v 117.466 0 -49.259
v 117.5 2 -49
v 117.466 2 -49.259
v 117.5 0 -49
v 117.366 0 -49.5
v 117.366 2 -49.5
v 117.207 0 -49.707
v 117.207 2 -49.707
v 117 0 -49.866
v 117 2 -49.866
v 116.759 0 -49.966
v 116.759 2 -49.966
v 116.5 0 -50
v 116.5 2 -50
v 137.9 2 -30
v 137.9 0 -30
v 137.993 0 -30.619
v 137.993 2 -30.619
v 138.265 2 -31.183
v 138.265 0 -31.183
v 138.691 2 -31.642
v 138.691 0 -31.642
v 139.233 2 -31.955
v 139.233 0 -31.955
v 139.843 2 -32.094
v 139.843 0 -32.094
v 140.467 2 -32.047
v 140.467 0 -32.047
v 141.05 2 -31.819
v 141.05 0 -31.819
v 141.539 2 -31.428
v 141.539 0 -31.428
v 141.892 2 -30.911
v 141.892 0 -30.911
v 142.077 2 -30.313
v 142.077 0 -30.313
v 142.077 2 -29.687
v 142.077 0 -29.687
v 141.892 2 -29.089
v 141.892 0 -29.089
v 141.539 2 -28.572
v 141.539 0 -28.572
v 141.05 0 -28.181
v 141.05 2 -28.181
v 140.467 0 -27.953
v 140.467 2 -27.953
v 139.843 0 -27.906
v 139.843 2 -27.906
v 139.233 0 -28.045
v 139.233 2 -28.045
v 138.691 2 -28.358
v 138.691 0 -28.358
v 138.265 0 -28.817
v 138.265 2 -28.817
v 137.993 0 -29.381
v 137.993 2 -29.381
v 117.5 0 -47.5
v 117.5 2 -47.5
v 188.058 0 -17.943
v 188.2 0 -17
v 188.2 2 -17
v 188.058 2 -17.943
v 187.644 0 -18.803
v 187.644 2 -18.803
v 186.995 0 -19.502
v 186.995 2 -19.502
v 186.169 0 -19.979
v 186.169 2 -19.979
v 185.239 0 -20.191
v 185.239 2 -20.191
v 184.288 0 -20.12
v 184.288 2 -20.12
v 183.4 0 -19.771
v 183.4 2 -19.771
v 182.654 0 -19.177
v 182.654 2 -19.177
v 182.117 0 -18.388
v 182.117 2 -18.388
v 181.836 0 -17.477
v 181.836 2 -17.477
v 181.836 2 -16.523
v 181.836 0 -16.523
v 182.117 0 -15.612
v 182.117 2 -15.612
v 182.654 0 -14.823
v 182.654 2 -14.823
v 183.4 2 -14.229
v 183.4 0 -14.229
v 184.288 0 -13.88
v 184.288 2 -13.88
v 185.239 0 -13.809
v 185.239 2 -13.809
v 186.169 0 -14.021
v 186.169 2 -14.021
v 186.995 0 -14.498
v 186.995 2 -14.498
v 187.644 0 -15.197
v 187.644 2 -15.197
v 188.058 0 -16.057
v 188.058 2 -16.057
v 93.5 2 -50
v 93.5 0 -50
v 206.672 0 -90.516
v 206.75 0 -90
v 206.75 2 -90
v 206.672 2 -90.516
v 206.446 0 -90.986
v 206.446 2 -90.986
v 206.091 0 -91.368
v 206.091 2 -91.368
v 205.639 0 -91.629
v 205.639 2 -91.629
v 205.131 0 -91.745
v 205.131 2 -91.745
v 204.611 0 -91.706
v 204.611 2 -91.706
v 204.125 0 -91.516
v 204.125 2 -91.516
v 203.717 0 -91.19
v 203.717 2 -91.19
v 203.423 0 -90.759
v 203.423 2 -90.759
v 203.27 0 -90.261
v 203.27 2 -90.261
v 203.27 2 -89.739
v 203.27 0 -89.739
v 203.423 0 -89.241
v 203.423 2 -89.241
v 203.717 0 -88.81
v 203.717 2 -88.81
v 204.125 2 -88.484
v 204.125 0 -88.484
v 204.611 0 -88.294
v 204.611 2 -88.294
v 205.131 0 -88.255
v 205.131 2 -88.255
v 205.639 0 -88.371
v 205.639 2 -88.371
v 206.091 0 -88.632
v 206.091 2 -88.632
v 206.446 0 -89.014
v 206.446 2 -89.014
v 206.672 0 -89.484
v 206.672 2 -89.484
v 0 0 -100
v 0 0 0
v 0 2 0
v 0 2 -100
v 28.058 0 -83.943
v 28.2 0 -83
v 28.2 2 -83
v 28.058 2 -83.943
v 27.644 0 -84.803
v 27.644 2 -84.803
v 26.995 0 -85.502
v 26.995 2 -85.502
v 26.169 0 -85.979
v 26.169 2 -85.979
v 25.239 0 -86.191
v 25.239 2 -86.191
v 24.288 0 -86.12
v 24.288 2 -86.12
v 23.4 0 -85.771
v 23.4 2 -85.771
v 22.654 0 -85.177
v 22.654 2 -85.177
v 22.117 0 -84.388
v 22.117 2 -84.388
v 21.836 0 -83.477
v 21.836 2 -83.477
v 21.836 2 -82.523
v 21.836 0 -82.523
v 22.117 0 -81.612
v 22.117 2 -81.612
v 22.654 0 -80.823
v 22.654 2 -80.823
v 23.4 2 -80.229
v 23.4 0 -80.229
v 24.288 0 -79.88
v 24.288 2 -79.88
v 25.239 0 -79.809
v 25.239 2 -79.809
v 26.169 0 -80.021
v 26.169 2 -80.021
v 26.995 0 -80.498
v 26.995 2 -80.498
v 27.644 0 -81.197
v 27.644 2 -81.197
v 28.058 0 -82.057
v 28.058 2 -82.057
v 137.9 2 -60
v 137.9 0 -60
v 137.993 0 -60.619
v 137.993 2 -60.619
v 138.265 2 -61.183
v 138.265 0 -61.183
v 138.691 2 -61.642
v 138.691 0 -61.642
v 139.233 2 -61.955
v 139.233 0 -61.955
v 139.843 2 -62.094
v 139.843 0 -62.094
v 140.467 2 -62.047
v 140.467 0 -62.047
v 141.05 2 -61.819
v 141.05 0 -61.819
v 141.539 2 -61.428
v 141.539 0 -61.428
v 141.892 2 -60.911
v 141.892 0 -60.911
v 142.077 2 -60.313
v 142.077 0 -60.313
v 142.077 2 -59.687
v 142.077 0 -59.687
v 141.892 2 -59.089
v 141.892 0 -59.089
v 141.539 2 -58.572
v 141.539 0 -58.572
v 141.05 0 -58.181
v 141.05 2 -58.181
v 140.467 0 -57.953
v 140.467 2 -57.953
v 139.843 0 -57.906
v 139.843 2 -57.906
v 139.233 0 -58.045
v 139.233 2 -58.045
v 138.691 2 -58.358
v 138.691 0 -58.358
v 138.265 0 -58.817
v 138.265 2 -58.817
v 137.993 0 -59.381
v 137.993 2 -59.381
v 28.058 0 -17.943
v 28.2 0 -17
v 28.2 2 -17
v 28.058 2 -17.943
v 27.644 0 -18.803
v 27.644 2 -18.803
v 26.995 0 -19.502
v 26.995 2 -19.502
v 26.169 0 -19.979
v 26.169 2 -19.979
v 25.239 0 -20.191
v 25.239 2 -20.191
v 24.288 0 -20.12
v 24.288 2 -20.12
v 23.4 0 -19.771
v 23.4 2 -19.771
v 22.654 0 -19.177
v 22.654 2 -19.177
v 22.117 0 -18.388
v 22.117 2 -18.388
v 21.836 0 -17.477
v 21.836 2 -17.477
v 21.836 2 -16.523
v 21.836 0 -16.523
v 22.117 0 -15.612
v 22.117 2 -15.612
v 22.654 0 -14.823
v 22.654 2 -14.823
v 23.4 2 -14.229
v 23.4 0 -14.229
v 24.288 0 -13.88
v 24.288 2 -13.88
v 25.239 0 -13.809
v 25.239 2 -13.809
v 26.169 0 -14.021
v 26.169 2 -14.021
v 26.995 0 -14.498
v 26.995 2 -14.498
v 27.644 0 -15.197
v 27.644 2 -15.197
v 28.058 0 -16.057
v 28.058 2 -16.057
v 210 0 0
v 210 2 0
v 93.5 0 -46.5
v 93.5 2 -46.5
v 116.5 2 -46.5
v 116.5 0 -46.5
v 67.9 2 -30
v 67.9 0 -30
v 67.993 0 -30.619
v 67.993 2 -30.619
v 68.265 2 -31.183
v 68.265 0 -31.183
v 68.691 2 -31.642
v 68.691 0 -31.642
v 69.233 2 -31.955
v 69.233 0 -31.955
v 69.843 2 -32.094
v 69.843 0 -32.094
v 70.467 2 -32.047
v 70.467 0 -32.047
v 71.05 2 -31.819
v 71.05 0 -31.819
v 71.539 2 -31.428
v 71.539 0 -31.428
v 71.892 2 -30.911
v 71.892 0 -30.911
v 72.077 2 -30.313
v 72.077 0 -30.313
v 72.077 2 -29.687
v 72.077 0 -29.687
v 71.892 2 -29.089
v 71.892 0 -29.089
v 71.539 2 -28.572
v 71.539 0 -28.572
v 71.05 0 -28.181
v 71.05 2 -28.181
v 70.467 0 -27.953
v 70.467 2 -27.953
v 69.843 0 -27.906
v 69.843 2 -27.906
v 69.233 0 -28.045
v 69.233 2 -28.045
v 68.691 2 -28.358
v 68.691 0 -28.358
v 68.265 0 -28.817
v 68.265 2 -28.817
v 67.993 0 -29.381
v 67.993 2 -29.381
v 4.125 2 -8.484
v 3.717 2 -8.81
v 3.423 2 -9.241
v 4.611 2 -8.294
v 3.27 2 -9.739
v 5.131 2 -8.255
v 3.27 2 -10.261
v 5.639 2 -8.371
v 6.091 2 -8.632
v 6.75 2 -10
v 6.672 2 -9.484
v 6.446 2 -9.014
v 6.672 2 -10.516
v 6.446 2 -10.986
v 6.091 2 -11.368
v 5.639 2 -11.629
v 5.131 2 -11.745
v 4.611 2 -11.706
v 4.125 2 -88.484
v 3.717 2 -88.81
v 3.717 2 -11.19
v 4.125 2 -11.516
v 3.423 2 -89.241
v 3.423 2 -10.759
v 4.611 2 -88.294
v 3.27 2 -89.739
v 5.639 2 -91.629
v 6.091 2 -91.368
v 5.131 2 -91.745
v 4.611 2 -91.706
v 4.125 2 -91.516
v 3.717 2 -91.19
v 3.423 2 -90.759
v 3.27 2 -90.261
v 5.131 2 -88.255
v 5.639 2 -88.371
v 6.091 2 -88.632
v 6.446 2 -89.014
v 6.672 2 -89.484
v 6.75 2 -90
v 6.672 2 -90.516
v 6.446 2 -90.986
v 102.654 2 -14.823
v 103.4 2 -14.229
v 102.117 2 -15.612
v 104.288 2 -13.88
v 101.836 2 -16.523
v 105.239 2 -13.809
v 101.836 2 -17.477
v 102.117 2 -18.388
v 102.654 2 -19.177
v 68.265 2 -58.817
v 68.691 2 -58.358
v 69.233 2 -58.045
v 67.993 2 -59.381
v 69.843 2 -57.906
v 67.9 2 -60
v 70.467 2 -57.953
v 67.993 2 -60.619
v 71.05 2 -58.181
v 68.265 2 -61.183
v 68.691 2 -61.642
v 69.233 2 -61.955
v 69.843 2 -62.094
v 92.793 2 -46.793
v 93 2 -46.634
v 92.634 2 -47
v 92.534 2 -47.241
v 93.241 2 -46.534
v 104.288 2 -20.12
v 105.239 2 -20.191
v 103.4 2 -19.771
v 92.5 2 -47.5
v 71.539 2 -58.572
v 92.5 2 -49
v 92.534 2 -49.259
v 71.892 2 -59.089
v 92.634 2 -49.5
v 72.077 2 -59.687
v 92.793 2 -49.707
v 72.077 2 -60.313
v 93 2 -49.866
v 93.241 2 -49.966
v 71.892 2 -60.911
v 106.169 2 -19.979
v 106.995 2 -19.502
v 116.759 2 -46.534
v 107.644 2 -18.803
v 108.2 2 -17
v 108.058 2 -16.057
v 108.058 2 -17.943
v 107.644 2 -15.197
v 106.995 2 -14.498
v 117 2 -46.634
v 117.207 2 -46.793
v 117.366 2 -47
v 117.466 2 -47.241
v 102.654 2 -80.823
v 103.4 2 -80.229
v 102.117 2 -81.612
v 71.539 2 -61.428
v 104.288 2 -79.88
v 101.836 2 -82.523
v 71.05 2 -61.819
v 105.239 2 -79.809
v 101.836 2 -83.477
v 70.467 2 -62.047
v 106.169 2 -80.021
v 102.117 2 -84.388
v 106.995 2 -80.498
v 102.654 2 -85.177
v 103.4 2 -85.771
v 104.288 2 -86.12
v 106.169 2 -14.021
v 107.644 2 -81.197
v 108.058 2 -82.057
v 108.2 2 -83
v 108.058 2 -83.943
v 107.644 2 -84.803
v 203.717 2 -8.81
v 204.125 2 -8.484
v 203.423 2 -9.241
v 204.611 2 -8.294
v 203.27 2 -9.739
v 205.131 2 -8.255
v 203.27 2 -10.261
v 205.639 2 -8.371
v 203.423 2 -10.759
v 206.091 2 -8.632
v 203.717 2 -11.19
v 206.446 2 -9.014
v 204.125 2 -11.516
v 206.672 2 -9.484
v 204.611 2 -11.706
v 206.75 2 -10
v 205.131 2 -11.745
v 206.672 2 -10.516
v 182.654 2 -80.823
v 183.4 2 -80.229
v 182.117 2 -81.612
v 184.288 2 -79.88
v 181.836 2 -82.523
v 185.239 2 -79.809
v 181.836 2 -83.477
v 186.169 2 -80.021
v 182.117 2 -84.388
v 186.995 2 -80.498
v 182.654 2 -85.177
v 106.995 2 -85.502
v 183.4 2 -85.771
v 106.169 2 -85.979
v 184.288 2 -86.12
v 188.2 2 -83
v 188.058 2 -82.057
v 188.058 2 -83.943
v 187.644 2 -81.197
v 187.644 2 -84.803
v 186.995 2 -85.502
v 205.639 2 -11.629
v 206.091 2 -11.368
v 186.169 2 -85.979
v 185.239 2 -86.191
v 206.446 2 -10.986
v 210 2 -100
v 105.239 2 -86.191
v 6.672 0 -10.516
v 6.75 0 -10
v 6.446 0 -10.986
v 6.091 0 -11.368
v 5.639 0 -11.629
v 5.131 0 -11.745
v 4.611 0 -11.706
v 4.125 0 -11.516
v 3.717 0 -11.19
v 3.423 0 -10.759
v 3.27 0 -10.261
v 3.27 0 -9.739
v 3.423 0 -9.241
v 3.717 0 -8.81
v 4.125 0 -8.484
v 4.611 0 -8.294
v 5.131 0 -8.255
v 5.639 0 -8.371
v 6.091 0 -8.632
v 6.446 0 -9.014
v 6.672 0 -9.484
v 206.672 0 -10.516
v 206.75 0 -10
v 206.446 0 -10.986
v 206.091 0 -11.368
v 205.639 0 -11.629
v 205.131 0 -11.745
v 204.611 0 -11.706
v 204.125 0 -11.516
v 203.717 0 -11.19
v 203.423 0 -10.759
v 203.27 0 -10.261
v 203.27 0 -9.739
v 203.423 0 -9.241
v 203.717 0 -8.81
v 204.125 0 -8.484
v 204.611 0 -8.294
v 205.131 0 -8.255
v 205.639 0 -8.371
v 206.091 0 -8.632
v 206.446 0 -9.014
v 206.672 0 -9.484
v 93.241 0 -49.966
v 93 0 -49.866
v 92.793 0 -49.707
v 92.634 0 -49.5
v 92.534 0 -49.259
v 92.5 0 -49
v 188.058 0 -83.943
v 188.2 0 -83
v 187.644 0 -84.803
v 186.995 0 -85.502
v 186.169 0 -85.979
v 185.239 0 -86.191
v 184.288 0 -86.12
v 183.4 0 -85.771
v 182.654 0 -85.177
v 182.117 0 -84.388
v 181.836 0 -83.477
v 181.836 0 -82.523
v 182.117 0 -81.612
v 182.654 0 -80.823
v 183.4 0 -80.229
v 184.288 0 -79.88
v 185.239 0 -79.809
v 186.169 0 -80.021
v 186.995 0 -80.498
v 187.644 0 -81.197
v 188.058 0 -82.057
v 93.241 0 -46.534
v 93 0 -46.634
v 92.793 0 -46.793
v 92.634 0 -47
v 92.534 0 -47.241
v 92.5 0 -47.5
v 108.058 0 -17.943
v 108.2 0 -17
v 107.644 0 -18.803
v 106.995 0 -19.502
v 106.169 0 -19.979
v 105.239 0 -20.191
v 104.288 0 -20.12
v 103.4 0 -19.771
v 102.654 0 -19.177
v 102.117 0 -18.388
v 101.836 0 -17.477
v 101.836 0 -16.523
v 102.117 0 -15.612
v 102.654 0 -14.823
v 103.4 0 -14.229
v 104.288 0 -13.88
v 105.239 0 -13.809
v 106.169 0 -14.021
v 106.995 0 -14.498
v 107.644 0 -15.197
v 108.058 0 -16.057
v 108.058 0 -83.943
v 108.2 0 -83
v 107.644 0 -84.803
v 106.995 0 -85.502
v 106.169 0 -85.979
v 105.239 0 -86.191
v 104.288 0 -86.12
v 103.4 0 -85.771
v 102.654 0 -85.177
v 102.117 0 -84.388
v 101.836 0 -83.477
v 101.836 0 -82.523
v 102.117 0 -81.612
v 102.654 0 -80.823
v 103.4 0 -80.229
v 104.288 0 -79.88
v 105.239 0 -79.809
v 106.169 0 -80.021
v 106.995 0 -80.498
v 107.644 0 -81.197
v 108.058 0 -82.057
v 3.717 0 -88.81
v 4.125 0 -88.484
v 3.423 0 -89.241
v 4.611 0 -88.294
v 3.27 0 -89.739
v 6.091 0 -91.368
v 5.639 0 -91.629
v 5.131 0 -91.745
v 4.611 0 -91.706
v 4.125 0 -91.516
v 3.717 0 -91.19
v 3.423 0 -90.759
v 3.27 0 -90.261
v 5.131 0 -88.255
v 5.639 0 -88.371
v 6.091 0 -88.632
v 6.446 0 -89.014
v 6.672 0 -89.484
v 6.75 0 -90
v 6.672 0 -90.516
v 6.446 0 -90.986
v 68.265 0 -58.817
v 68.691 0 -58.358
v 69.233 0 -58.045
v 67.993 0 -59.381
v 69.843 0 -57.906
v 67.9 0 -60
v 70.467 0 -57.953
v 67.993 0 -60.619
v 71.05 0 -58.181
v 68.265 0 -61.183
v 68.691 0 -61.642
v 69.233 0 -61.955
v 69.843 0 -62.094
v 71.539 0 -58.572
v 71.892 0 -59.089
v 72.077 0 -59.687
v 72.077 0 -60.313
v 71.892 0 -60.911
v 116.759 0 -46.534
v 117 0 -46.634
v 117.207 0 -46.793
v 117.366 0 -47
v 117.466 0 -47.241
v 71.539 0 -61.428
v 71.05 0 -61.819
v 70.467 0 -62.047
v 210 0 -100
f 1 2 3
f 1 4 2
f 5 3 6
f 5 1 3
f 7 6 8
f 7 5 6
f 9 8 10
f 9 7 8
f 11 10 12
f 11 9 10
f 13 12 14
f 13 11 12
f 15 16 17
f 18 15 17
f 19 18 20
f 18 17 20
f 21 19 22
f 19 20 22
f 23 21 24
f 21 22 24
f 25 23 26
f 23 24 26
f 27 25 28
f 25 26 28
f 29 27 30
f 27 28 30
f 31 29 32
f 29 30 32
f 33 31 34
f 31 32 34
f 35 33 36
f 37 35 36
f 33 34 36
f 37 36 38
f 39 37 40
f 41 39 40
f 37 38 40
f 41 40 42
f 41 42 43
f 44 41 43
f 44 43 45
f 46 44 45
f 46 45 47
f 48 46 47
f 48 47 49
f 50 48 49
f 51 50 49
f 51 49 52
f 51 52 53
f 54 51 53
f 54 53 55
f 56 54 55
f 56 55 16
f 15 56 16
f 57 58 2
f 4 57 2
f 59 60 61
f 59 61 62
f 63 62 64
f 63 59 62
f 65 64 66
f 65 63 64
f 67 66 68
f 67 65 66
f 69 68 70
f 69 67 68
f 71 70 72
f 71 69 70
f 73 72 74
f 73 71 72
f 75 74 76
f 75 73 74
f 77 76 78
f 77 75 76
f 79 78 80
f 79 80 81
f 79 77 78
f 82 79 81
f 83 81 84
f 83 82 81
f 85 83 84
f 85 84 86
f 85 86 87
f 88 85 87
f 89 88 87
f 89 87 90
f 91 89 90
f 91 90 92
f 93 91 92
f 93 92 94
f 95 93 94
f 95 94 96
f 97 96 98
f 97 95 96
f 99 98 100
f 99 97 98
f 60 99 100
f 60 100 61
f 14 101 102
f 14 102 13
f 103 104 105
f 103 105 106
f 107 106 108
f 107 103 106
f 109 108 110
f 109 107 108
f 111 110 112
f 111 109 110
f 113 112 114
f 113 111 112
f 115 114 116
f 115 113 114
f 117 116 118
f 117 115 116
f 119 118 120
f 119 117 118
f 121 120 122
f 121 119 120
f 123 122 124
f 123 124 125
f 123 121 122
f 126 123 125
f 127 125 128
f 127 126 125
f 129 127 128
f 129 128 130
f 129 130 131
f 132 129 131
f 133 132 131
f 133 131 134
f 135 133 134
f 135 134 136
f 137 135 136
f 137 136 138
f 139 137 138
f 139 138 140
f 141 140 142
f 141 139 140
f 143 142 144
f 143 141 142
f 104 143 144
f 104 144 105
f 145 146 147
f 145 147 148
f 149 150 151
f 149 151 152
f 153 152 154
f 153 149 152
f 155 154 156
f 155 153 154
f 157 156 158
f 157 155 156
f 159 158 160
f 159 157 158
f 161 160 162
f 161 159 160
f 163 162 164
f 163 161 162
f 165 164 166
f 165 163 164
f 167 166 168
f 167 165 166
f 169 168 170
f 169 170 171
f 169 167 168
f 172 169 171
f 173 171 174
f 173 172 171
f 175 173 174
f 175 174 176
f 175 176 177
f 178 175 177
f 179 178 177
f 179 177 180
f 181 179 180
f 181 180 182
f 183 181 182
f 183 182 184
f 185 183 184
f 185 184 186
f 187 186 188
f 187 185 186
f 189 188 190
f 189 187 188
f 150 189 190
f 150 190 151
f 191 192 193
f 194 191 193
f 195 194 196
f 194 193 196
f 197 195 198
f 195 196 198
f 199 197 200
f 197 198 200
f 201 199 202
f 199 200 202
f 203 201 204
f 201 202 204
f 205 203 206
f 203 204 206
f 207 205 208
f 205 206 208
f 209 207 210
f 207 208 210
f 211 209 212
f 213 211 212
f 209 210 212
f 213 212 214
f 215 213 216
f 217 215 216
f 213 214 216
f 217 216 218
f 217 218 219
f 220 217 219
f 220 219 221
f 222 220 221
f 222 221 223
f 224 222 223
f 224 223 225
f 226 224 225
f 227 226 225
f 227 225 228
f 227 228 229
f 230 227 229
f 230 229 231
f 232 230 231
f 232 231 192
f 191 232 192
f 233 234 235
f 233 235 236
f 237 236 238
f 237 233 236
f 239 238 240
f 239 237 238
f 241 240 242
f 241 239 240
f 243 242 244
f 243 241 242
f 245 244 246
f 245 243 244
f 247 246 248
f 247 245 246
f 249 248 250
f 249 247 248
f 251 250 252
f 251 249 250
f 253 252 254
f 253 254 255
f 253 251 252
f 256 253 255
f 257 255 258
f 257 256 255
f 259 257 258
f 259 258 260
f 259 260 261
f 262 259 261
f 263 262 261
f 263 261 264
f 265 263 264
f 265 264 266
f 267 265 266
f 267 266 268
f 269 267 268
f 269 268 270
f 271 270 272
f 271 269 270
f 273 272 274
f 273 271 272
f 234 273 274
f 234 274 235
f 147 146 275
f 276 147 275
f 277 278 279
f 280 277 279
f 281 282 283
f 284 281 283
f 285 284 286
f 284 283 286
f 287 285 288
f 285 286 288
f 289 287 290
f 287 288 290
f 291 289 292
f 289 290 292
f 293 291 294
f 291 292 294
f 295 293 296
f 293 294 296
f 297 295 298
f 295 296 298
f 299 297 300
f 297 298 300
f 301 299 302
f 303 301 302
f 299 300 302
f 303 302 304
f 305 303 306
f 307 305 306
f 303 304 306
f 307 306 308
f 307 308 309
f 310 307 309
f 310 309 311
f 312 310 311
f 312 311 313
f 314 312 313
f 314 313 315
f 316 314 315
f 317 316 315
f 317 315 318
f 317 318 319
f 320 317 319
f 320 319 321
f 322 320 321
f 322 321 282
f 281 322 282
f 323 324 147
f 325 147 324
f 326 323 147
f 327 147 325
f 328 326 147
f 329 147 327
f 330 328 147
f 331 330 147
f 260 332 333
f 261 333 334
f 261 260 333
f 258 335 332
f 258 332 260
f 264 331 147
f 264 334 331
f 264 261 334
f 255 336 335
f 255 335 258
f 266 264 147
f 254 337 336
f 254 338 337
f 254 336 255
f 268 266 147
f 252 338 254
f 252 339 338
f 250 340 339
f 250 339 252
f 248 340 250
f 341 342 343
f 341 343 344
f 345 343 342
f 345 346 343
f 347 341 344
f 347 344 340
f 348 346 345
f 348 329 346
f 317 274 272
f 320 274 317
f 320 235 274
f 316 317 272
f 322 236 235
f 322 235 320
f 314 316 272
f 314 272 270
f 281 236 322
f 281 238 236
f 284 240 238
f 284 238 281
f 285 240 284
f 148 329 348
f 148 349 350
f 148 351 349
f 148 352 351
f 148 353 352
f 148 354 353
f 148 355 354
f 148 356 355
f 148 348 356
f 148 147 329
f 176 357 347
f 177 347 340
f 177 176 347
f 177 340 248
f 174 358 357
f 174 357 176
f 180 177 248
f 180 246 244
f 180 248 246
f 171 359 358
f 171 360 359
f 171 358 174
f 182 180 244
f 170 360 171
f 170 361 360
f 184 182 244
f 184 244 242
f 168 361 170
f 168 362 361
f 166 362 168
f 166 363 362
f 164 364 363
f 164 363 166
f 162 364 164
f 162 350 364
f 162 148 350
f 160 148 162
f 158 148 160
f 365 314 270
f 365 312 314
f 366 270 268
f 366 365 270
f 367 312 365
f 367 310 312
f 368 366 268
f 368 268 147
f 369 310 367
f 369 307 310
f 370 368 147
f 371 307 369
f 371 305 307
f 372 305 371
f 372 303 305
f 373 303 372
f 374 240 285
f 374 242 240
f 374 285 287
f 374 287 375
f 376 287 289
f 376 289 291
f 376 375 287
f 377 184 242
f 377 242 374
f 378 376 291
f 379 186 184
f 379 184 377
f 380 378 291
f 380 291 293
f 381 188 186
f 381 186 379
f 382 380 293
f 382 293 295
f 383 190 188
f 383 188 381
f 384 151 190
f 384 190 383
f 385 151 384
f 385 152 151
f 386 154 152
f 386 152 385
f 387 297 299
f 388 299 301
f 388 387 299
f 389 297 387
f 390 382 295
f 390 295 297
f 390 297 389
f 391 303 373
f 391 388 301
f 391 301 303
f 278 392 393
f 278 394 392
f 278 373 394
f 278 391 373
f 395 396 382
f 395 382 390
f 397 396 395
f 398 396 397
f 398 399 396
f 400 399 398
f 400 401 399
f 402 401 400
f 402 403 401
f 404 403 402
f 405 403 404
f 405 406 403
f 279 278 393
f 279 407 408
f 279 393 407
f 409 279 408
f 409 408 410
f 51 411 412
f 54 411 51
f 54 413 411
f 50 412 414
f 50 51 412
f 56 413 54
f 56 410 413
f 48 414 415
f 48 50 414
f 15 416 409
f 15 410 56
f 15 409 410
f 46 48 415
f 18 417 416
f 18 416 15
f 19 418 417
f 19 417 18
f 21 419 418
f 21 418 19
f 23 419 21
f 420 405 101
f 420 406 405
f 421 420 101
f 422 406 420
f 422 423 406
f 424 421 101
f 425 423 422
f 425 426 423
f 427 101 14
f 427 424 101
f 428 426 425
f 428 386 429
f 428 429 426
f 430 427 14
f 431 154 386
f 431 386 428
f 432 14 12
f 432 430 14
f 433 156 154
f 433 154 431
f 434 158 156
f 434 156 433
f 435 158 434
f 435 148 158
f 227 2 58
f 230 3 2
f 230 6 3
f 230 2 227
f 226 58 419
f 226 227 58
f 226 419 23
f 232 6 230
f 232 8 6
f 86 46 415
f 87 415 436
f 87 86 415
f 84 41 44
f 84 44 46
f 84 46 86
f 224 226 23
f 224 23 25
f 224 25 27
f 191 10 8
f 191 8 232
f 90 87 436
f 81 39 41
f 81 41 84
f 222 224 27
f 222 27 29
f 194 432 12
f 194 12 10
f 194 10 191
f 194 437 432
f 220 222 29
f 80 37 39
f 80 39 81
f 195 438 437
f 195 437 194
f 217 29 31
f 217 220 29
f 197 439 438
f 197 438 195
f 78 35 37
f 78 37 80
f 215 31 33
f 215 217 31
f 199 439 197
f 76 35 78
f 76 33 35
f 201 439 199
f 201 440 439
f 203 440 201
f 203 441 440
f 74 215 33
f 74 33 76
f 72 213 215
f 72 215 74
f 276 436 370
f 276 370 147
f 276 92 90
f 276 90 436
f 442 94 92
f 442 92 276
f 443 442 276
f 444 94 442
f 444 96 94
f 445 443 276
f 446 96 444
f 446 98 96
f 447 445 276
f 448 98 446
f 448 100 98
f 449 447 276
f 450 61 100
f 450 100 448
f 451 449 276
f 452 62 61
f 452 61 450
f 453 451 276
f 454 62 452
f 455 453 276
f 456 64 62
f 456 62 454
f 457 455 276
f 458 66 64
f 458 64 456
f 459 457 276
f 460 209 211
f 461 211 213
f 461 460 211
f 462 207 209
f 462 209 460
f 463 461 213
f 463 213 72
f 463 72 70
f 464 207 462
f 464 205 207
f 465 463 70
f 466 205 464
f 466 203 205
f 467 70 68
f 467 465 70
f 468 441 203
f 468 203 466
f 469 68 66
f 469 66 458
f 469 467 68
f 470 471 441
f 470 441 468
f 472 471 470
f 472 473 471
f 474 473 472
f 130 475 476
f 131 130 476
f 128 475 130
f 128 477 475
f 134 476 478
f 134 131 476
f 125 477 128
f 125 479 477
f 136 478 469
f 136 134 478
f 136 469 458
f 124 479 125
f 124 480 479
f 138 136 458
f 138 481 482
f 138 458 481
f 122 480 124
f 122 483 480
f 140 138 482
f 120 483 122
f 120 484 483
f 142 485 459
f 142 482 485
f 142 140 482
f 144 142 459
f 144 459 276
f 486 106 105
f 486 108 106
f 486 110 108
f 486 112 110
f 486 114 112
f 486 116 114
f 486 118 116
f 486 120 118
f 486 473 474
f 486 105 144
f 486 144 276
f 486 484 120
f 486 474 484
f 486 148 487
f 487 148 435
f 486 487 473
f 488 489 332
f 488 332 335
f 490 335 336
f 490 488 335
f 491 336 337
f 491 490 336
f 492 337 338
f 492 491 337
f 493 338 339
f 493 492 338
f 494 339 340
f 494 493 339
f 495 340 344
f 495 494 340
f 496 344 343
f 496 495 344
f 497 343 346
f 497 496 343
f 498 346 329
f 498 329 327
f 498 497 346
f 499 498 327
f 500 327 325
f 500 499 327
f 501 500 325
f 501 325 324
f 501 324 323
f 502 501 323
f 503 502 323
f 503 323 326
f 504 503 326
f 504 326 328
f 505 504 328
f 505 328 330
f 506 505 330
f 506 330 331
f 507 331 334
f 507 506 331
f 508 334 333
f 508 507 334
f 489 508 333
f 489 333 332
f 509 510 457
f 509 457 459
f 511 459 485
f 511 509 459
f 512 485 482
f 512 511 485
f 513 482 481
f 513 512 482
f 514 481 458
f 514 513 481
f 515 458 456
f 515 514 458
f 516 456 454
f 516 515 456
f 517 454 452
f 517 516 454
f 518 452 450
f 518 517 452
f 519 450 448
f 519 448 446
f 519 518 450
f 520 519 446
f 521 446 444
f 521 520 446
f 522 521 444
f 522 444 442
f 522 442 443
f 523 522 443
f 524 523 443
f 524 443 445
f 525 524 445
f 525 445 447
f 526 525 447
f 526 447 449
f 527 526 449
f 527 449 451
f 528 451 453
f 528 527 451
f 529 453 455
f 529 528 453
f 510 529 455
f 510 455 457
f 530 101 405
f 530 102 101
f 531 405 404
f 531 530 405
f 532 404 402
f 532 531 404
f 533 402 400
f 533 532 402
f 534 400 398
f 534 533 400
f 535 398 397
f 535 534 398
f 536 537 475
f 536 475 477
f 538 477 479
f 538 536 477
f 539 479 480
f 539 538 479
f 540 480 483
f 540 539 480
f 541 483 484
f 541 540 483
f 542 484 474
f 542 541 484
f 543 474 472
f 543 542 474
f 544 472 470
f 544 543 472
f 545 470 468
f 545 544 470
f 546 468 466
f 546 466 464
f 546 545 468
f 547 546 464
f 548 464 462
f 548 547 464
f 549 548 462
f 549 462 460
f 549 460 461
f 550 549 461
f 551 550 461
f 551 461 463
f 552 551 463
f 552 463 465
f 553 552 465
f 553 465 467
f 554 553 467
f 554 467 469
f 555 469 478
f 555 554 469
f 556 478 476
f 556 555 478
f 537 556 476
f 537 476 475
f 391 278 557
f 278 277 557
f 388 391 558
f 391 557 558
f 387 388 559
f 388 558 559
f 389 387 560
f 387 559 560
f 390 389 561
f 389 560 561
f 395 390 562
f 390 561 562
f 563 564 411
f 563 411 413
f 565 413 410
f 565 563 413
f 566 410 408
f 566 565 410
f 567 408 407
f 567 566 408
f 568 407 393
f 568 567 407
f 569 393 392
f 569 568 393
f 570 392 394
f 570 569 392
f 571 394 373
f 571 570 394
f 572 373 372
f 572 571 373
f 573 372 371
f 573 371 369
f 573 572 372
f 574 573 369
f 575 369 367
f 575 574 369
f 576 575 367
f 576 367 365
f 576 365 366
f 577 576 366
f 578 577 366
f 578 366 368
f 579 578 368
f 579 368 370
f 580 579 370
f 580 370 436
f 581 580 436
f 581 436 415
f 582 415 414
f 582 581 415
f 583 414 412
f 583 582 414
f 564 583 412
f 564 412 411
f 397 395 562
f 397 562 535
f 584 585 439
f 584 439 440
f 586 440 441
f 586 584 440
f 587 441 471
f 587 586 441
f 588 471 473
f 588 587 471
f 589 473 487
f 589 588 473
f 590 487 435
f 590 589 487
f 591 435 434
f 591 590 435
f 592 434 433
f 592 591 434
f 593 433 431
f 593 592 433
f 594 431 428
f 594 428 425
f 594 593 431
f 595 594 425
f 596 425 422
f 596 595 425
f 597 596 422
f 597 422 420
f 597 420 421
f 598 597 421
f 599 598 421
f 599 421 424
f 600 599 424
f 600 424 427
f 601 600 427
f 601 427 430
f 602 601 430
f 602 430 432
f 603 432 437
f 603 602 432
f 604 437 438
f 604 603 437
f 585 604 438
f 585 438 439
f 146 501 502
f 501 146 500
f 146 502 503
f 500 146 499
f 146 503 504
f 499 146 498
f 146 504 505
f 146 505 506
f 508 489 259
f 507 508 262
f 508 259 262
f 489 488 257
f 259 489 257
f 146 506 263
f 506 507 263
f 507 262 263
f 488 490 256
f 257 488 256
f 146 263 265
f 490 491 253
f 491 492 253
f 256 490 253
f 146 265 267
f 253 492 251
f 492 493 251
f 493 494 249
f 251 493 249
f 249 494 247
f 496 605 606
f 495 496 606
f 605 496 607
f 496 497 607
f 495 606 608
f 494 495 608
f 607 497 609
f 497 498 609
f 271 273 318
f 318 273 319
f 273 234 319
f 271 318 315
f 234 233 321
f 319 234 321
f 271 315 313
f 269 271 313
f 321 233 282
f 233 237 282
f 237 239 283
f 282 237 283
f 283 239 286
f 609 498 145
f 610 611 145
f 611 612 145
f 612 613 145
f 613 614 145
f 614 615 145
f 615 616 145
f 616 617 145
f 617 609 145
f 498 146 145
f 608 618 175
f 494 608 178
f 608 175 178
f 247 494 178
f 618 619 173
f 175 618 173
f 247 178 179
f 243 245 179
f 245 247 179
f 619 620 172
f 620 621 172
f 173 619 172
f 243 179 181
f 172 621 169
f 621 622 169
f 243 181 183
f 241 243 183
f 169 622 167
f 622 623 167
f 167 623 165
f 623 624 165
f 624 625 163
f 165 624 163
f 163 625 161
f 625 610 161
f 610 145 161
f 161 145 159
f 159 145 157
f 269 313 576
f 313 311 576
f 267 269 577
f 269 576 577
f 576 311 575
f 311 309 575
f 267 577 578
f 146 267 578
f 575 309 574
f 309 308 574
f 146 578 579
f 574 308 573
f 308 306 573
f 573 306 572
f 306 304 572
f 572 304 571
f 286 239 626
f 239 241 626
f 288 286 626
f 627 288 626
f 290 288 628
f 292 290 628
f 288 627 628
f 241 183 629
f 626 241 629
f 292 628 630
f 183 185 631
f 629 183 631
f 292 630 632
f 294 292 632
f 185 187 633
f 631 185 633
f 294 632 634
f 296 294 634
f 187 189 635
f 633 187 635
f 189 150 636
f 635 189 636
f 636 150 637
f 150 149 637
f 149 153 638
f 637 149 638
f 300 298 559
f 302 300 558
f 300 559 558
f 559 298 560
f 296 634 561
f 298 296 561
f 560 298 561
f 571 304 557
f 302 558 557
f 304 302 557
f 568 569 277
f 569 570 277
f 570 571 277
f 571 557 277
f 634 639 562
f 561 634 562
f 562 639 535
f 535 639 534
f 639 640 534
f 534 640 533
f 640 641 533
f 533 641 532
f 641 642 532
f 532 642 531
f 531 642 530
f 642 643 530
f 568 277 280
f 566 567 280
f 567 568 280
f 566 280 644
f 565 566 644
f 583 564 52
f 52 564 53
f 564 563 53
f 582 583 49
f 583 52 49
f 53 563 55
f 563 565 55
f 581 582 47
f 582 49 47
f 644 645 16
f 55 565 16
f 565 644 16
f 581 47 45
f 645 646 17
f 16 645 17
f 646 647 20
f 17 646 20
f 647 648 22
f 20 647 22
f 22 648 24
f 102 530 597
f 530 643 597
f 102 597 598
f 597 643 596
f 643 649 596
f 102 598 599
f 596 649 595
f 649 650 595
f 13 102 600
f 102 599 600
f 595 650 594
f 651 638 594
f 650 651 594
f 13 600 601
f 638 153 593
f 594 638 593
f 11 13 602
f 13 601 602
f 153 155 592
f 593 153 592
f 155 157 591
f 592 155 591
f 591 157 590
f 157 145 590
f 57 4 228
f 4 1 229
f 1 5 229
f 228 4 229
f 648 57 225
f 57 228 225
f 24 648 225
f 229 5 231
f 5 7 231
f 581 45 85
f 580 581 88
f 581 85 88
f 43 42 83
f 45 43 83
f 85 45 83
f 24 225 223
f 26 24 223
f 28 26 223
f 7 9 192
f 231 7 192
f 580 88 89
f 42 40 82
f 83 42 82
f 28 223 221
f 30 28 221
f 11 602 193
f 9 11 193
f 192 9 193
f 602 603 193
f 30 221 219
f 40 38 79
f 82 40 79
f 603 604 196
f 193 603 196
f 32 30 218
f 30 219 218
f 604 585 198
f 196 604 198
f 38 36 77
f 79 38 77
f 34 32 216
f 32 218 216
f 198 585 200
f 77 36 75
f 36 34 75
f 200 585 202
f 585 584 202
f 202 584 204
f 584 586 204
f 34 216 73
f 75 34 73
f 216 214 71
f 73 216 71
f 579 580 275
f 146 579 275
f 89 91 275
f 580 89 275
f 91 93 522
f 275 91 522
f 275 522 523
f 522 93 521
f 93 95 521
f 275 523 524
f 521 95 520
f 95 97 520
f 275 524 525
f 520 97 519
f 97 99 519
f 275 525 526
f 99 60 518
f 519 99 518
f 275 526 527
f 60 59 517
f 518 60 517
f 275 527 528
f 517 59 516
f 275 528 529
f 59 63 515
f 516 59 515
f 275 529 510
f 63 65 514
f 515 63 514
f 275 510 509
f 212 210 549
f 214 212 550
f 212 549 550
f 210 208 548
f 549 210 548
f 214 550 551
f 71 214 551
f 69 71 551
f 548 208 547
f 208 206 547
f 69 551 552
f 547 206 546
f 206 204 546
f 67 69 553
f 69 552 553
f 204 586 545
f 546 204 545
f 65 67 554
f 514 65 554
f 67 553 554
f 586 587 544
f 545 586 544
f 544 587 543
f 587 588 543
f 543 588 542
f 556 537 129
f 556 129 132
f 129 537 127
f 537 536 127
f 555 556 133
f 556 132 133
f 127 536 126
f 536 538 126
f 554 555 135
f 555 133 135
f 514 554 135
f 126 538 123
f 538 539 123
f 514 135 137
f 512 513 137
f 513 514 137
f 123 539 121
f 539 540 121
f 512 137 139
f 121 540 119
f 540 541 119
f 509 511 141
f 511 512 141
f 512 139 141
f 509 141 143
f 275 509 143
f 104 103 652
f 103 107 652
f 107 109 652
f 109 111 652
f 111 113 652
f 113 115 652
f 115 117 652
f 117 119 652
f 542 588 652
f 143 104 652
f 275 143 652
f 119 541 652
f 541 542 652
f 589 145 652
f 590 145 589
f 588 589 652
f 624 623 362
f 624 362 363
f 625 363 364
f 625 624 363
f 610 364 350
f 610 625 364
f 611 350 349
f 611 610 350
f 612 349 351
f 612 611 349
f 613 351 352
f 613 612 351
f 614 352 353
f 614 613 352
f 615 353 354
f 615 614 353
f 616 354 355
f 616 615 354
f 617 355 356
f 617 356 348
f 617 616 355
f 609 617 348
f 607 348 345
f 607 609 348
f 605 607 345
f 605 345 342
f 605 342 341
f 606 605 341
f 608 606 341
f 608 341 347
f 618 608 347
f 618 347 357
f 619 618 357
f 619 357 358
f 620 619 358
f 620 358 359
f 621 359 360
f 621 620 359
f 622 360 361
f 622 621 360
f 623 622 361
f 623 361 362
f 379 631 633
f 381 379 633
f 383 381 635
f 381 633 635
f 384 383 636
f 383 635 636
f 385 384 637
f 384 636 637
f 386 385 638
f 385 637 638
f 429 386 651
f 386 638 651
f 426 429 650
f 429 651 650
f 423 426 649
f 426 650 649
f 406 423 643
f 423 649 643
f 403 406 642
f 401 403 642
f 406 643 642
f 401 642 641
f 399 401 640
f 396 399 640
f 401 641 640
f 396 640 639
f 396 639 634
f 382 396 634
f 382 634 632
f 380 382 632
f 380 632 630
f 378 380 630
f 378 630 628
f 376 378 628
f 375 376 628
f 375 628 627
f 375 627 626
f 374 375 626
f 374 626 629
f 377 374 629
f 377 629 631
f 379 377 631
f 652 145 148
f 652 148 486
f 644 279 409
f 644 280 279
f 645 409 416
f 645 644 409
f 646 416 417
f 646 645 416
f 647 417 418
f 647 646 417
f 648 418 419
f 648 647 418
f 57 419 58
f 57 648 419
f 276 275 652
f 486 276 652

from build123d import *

# Parameters (mm, degrees)
SKETCH_1_W            = 210
SKETCH_1_H            = 100
SKETCH_1_R            = 3.2
SKETCH_1_R_2          = 1.75
EXTRUDE_1_DEPTH       = 2
HOLE_WIZARD_M41_D     = 4.2
HOLE_WIZARD_M41_DEPTH = 8
HOLE_WIZARD_M41_TIP   = 1.2618073
SKETCH_4_W            = 25
SKETCH_4_H            = 3.5
CUT_EXTRUDE_1_DEPTH   = 10
FILLET_1_R            = 1


with BuildPart() as part:
    # Эскиз1 → Бобышка-Вытянуть1 (new body)
    with BuildSketch(Plane(origin=(0, 0, 0), x_dir=(1, 0, 0), z_dir=(0, 1, 0))):
        with Locations((105, 50)):
            Rectangle(SKETCH_1_W, SKETCH_1_H)
        with Locations((105, 17)):
            Circle(SKETCH_1_R, mode=Mode.SUBTRACT)
        with Locations((185, 17)):
            Circle(SKETCH_1_R, mode=Mode.SUBTRACT)
        with Locations((25, 17)):
            Circle(SKETCH_1_R, mode=Mode.SUBTRACT)
        with Locations((25, 83)):
            Circle(SKETCH_1_R, mode=Mode.SUBTRACT)
        with Locations((105, 83)):
            Circle(SKETCH_1_R, mode=Mode.SUBTRACT)
        with Locations((185, 83)):
            Circle(SKETCH_1_R, mode=Mode.SUBTRACT)
        with Locations((5, 10)):
            Circle(SKETCH_1_R_2, mode=Mode.SUBTRACT)
        with Locations((5, 90)):
            Circle(SKETCH_1_R_2, mode=Mode.SUBTRACT)
        with Locations((205, 10)):
            Circle(SKETCH_1_R_2, mode=Mode.SUBTRACT)
        with Locations((205, 90)):
            Circle(SKETCH_1_R_2, mode=Mode.SUBTRACT)
    extrude(amount=EXTRUDE_1_DEPTH)

    # Сверло под метчик  спиральное M41
    with Locations(Plane(origin=(0, 2, 0), x_dir=(1, 0, 0), z_dir=(0, 1, 0))):
        with Locations((70, 60), (140, 60), (140, 30), (70, 30)):
            Hole(HOLE_WIZARD_M41_D / 2, depth=HOLE_WIZARD_M41_DEPTH)
            with Locations((0, 0, -(HOLE_WIZARD_M41_DEPTH + HOLE_WIZARD_M41_TIP / 2))):  # 118° drill point
                Cone(0, HOLE_WIZARD_M41_D / 2, HOLE_WIZARD_M41_TIP, mode=Mode.SUBTRACT)

    # Эскиз4 → Вырез-Вытянуть1 (cut)
    with BuildSketch(Plane(origin=(0, 2, 0), x_dir=(1, 0, 0), z_dir=(0, 1, 0))):
        with Locations((105, 48.25)):
            Rectangle(SKETCH_4_W, SKETCH_4_H)
    extrude(amount=-CUT_EXTRUDE_1_DEPTH, mode=Mode.SUBTRACT)

    # Скругление1
    fillet_1_edges = [part.edges().sort_by_distance(p)[0] for p in [
        (92.5, 1, -46.5),
        (92.5, 1, -50),
        (117.5, 1, -50),
        (117.5, 1, -46.5),
    ]]
    fillet(fillet_1_edges, radius=FILLET_1_R)


solid = part.part
